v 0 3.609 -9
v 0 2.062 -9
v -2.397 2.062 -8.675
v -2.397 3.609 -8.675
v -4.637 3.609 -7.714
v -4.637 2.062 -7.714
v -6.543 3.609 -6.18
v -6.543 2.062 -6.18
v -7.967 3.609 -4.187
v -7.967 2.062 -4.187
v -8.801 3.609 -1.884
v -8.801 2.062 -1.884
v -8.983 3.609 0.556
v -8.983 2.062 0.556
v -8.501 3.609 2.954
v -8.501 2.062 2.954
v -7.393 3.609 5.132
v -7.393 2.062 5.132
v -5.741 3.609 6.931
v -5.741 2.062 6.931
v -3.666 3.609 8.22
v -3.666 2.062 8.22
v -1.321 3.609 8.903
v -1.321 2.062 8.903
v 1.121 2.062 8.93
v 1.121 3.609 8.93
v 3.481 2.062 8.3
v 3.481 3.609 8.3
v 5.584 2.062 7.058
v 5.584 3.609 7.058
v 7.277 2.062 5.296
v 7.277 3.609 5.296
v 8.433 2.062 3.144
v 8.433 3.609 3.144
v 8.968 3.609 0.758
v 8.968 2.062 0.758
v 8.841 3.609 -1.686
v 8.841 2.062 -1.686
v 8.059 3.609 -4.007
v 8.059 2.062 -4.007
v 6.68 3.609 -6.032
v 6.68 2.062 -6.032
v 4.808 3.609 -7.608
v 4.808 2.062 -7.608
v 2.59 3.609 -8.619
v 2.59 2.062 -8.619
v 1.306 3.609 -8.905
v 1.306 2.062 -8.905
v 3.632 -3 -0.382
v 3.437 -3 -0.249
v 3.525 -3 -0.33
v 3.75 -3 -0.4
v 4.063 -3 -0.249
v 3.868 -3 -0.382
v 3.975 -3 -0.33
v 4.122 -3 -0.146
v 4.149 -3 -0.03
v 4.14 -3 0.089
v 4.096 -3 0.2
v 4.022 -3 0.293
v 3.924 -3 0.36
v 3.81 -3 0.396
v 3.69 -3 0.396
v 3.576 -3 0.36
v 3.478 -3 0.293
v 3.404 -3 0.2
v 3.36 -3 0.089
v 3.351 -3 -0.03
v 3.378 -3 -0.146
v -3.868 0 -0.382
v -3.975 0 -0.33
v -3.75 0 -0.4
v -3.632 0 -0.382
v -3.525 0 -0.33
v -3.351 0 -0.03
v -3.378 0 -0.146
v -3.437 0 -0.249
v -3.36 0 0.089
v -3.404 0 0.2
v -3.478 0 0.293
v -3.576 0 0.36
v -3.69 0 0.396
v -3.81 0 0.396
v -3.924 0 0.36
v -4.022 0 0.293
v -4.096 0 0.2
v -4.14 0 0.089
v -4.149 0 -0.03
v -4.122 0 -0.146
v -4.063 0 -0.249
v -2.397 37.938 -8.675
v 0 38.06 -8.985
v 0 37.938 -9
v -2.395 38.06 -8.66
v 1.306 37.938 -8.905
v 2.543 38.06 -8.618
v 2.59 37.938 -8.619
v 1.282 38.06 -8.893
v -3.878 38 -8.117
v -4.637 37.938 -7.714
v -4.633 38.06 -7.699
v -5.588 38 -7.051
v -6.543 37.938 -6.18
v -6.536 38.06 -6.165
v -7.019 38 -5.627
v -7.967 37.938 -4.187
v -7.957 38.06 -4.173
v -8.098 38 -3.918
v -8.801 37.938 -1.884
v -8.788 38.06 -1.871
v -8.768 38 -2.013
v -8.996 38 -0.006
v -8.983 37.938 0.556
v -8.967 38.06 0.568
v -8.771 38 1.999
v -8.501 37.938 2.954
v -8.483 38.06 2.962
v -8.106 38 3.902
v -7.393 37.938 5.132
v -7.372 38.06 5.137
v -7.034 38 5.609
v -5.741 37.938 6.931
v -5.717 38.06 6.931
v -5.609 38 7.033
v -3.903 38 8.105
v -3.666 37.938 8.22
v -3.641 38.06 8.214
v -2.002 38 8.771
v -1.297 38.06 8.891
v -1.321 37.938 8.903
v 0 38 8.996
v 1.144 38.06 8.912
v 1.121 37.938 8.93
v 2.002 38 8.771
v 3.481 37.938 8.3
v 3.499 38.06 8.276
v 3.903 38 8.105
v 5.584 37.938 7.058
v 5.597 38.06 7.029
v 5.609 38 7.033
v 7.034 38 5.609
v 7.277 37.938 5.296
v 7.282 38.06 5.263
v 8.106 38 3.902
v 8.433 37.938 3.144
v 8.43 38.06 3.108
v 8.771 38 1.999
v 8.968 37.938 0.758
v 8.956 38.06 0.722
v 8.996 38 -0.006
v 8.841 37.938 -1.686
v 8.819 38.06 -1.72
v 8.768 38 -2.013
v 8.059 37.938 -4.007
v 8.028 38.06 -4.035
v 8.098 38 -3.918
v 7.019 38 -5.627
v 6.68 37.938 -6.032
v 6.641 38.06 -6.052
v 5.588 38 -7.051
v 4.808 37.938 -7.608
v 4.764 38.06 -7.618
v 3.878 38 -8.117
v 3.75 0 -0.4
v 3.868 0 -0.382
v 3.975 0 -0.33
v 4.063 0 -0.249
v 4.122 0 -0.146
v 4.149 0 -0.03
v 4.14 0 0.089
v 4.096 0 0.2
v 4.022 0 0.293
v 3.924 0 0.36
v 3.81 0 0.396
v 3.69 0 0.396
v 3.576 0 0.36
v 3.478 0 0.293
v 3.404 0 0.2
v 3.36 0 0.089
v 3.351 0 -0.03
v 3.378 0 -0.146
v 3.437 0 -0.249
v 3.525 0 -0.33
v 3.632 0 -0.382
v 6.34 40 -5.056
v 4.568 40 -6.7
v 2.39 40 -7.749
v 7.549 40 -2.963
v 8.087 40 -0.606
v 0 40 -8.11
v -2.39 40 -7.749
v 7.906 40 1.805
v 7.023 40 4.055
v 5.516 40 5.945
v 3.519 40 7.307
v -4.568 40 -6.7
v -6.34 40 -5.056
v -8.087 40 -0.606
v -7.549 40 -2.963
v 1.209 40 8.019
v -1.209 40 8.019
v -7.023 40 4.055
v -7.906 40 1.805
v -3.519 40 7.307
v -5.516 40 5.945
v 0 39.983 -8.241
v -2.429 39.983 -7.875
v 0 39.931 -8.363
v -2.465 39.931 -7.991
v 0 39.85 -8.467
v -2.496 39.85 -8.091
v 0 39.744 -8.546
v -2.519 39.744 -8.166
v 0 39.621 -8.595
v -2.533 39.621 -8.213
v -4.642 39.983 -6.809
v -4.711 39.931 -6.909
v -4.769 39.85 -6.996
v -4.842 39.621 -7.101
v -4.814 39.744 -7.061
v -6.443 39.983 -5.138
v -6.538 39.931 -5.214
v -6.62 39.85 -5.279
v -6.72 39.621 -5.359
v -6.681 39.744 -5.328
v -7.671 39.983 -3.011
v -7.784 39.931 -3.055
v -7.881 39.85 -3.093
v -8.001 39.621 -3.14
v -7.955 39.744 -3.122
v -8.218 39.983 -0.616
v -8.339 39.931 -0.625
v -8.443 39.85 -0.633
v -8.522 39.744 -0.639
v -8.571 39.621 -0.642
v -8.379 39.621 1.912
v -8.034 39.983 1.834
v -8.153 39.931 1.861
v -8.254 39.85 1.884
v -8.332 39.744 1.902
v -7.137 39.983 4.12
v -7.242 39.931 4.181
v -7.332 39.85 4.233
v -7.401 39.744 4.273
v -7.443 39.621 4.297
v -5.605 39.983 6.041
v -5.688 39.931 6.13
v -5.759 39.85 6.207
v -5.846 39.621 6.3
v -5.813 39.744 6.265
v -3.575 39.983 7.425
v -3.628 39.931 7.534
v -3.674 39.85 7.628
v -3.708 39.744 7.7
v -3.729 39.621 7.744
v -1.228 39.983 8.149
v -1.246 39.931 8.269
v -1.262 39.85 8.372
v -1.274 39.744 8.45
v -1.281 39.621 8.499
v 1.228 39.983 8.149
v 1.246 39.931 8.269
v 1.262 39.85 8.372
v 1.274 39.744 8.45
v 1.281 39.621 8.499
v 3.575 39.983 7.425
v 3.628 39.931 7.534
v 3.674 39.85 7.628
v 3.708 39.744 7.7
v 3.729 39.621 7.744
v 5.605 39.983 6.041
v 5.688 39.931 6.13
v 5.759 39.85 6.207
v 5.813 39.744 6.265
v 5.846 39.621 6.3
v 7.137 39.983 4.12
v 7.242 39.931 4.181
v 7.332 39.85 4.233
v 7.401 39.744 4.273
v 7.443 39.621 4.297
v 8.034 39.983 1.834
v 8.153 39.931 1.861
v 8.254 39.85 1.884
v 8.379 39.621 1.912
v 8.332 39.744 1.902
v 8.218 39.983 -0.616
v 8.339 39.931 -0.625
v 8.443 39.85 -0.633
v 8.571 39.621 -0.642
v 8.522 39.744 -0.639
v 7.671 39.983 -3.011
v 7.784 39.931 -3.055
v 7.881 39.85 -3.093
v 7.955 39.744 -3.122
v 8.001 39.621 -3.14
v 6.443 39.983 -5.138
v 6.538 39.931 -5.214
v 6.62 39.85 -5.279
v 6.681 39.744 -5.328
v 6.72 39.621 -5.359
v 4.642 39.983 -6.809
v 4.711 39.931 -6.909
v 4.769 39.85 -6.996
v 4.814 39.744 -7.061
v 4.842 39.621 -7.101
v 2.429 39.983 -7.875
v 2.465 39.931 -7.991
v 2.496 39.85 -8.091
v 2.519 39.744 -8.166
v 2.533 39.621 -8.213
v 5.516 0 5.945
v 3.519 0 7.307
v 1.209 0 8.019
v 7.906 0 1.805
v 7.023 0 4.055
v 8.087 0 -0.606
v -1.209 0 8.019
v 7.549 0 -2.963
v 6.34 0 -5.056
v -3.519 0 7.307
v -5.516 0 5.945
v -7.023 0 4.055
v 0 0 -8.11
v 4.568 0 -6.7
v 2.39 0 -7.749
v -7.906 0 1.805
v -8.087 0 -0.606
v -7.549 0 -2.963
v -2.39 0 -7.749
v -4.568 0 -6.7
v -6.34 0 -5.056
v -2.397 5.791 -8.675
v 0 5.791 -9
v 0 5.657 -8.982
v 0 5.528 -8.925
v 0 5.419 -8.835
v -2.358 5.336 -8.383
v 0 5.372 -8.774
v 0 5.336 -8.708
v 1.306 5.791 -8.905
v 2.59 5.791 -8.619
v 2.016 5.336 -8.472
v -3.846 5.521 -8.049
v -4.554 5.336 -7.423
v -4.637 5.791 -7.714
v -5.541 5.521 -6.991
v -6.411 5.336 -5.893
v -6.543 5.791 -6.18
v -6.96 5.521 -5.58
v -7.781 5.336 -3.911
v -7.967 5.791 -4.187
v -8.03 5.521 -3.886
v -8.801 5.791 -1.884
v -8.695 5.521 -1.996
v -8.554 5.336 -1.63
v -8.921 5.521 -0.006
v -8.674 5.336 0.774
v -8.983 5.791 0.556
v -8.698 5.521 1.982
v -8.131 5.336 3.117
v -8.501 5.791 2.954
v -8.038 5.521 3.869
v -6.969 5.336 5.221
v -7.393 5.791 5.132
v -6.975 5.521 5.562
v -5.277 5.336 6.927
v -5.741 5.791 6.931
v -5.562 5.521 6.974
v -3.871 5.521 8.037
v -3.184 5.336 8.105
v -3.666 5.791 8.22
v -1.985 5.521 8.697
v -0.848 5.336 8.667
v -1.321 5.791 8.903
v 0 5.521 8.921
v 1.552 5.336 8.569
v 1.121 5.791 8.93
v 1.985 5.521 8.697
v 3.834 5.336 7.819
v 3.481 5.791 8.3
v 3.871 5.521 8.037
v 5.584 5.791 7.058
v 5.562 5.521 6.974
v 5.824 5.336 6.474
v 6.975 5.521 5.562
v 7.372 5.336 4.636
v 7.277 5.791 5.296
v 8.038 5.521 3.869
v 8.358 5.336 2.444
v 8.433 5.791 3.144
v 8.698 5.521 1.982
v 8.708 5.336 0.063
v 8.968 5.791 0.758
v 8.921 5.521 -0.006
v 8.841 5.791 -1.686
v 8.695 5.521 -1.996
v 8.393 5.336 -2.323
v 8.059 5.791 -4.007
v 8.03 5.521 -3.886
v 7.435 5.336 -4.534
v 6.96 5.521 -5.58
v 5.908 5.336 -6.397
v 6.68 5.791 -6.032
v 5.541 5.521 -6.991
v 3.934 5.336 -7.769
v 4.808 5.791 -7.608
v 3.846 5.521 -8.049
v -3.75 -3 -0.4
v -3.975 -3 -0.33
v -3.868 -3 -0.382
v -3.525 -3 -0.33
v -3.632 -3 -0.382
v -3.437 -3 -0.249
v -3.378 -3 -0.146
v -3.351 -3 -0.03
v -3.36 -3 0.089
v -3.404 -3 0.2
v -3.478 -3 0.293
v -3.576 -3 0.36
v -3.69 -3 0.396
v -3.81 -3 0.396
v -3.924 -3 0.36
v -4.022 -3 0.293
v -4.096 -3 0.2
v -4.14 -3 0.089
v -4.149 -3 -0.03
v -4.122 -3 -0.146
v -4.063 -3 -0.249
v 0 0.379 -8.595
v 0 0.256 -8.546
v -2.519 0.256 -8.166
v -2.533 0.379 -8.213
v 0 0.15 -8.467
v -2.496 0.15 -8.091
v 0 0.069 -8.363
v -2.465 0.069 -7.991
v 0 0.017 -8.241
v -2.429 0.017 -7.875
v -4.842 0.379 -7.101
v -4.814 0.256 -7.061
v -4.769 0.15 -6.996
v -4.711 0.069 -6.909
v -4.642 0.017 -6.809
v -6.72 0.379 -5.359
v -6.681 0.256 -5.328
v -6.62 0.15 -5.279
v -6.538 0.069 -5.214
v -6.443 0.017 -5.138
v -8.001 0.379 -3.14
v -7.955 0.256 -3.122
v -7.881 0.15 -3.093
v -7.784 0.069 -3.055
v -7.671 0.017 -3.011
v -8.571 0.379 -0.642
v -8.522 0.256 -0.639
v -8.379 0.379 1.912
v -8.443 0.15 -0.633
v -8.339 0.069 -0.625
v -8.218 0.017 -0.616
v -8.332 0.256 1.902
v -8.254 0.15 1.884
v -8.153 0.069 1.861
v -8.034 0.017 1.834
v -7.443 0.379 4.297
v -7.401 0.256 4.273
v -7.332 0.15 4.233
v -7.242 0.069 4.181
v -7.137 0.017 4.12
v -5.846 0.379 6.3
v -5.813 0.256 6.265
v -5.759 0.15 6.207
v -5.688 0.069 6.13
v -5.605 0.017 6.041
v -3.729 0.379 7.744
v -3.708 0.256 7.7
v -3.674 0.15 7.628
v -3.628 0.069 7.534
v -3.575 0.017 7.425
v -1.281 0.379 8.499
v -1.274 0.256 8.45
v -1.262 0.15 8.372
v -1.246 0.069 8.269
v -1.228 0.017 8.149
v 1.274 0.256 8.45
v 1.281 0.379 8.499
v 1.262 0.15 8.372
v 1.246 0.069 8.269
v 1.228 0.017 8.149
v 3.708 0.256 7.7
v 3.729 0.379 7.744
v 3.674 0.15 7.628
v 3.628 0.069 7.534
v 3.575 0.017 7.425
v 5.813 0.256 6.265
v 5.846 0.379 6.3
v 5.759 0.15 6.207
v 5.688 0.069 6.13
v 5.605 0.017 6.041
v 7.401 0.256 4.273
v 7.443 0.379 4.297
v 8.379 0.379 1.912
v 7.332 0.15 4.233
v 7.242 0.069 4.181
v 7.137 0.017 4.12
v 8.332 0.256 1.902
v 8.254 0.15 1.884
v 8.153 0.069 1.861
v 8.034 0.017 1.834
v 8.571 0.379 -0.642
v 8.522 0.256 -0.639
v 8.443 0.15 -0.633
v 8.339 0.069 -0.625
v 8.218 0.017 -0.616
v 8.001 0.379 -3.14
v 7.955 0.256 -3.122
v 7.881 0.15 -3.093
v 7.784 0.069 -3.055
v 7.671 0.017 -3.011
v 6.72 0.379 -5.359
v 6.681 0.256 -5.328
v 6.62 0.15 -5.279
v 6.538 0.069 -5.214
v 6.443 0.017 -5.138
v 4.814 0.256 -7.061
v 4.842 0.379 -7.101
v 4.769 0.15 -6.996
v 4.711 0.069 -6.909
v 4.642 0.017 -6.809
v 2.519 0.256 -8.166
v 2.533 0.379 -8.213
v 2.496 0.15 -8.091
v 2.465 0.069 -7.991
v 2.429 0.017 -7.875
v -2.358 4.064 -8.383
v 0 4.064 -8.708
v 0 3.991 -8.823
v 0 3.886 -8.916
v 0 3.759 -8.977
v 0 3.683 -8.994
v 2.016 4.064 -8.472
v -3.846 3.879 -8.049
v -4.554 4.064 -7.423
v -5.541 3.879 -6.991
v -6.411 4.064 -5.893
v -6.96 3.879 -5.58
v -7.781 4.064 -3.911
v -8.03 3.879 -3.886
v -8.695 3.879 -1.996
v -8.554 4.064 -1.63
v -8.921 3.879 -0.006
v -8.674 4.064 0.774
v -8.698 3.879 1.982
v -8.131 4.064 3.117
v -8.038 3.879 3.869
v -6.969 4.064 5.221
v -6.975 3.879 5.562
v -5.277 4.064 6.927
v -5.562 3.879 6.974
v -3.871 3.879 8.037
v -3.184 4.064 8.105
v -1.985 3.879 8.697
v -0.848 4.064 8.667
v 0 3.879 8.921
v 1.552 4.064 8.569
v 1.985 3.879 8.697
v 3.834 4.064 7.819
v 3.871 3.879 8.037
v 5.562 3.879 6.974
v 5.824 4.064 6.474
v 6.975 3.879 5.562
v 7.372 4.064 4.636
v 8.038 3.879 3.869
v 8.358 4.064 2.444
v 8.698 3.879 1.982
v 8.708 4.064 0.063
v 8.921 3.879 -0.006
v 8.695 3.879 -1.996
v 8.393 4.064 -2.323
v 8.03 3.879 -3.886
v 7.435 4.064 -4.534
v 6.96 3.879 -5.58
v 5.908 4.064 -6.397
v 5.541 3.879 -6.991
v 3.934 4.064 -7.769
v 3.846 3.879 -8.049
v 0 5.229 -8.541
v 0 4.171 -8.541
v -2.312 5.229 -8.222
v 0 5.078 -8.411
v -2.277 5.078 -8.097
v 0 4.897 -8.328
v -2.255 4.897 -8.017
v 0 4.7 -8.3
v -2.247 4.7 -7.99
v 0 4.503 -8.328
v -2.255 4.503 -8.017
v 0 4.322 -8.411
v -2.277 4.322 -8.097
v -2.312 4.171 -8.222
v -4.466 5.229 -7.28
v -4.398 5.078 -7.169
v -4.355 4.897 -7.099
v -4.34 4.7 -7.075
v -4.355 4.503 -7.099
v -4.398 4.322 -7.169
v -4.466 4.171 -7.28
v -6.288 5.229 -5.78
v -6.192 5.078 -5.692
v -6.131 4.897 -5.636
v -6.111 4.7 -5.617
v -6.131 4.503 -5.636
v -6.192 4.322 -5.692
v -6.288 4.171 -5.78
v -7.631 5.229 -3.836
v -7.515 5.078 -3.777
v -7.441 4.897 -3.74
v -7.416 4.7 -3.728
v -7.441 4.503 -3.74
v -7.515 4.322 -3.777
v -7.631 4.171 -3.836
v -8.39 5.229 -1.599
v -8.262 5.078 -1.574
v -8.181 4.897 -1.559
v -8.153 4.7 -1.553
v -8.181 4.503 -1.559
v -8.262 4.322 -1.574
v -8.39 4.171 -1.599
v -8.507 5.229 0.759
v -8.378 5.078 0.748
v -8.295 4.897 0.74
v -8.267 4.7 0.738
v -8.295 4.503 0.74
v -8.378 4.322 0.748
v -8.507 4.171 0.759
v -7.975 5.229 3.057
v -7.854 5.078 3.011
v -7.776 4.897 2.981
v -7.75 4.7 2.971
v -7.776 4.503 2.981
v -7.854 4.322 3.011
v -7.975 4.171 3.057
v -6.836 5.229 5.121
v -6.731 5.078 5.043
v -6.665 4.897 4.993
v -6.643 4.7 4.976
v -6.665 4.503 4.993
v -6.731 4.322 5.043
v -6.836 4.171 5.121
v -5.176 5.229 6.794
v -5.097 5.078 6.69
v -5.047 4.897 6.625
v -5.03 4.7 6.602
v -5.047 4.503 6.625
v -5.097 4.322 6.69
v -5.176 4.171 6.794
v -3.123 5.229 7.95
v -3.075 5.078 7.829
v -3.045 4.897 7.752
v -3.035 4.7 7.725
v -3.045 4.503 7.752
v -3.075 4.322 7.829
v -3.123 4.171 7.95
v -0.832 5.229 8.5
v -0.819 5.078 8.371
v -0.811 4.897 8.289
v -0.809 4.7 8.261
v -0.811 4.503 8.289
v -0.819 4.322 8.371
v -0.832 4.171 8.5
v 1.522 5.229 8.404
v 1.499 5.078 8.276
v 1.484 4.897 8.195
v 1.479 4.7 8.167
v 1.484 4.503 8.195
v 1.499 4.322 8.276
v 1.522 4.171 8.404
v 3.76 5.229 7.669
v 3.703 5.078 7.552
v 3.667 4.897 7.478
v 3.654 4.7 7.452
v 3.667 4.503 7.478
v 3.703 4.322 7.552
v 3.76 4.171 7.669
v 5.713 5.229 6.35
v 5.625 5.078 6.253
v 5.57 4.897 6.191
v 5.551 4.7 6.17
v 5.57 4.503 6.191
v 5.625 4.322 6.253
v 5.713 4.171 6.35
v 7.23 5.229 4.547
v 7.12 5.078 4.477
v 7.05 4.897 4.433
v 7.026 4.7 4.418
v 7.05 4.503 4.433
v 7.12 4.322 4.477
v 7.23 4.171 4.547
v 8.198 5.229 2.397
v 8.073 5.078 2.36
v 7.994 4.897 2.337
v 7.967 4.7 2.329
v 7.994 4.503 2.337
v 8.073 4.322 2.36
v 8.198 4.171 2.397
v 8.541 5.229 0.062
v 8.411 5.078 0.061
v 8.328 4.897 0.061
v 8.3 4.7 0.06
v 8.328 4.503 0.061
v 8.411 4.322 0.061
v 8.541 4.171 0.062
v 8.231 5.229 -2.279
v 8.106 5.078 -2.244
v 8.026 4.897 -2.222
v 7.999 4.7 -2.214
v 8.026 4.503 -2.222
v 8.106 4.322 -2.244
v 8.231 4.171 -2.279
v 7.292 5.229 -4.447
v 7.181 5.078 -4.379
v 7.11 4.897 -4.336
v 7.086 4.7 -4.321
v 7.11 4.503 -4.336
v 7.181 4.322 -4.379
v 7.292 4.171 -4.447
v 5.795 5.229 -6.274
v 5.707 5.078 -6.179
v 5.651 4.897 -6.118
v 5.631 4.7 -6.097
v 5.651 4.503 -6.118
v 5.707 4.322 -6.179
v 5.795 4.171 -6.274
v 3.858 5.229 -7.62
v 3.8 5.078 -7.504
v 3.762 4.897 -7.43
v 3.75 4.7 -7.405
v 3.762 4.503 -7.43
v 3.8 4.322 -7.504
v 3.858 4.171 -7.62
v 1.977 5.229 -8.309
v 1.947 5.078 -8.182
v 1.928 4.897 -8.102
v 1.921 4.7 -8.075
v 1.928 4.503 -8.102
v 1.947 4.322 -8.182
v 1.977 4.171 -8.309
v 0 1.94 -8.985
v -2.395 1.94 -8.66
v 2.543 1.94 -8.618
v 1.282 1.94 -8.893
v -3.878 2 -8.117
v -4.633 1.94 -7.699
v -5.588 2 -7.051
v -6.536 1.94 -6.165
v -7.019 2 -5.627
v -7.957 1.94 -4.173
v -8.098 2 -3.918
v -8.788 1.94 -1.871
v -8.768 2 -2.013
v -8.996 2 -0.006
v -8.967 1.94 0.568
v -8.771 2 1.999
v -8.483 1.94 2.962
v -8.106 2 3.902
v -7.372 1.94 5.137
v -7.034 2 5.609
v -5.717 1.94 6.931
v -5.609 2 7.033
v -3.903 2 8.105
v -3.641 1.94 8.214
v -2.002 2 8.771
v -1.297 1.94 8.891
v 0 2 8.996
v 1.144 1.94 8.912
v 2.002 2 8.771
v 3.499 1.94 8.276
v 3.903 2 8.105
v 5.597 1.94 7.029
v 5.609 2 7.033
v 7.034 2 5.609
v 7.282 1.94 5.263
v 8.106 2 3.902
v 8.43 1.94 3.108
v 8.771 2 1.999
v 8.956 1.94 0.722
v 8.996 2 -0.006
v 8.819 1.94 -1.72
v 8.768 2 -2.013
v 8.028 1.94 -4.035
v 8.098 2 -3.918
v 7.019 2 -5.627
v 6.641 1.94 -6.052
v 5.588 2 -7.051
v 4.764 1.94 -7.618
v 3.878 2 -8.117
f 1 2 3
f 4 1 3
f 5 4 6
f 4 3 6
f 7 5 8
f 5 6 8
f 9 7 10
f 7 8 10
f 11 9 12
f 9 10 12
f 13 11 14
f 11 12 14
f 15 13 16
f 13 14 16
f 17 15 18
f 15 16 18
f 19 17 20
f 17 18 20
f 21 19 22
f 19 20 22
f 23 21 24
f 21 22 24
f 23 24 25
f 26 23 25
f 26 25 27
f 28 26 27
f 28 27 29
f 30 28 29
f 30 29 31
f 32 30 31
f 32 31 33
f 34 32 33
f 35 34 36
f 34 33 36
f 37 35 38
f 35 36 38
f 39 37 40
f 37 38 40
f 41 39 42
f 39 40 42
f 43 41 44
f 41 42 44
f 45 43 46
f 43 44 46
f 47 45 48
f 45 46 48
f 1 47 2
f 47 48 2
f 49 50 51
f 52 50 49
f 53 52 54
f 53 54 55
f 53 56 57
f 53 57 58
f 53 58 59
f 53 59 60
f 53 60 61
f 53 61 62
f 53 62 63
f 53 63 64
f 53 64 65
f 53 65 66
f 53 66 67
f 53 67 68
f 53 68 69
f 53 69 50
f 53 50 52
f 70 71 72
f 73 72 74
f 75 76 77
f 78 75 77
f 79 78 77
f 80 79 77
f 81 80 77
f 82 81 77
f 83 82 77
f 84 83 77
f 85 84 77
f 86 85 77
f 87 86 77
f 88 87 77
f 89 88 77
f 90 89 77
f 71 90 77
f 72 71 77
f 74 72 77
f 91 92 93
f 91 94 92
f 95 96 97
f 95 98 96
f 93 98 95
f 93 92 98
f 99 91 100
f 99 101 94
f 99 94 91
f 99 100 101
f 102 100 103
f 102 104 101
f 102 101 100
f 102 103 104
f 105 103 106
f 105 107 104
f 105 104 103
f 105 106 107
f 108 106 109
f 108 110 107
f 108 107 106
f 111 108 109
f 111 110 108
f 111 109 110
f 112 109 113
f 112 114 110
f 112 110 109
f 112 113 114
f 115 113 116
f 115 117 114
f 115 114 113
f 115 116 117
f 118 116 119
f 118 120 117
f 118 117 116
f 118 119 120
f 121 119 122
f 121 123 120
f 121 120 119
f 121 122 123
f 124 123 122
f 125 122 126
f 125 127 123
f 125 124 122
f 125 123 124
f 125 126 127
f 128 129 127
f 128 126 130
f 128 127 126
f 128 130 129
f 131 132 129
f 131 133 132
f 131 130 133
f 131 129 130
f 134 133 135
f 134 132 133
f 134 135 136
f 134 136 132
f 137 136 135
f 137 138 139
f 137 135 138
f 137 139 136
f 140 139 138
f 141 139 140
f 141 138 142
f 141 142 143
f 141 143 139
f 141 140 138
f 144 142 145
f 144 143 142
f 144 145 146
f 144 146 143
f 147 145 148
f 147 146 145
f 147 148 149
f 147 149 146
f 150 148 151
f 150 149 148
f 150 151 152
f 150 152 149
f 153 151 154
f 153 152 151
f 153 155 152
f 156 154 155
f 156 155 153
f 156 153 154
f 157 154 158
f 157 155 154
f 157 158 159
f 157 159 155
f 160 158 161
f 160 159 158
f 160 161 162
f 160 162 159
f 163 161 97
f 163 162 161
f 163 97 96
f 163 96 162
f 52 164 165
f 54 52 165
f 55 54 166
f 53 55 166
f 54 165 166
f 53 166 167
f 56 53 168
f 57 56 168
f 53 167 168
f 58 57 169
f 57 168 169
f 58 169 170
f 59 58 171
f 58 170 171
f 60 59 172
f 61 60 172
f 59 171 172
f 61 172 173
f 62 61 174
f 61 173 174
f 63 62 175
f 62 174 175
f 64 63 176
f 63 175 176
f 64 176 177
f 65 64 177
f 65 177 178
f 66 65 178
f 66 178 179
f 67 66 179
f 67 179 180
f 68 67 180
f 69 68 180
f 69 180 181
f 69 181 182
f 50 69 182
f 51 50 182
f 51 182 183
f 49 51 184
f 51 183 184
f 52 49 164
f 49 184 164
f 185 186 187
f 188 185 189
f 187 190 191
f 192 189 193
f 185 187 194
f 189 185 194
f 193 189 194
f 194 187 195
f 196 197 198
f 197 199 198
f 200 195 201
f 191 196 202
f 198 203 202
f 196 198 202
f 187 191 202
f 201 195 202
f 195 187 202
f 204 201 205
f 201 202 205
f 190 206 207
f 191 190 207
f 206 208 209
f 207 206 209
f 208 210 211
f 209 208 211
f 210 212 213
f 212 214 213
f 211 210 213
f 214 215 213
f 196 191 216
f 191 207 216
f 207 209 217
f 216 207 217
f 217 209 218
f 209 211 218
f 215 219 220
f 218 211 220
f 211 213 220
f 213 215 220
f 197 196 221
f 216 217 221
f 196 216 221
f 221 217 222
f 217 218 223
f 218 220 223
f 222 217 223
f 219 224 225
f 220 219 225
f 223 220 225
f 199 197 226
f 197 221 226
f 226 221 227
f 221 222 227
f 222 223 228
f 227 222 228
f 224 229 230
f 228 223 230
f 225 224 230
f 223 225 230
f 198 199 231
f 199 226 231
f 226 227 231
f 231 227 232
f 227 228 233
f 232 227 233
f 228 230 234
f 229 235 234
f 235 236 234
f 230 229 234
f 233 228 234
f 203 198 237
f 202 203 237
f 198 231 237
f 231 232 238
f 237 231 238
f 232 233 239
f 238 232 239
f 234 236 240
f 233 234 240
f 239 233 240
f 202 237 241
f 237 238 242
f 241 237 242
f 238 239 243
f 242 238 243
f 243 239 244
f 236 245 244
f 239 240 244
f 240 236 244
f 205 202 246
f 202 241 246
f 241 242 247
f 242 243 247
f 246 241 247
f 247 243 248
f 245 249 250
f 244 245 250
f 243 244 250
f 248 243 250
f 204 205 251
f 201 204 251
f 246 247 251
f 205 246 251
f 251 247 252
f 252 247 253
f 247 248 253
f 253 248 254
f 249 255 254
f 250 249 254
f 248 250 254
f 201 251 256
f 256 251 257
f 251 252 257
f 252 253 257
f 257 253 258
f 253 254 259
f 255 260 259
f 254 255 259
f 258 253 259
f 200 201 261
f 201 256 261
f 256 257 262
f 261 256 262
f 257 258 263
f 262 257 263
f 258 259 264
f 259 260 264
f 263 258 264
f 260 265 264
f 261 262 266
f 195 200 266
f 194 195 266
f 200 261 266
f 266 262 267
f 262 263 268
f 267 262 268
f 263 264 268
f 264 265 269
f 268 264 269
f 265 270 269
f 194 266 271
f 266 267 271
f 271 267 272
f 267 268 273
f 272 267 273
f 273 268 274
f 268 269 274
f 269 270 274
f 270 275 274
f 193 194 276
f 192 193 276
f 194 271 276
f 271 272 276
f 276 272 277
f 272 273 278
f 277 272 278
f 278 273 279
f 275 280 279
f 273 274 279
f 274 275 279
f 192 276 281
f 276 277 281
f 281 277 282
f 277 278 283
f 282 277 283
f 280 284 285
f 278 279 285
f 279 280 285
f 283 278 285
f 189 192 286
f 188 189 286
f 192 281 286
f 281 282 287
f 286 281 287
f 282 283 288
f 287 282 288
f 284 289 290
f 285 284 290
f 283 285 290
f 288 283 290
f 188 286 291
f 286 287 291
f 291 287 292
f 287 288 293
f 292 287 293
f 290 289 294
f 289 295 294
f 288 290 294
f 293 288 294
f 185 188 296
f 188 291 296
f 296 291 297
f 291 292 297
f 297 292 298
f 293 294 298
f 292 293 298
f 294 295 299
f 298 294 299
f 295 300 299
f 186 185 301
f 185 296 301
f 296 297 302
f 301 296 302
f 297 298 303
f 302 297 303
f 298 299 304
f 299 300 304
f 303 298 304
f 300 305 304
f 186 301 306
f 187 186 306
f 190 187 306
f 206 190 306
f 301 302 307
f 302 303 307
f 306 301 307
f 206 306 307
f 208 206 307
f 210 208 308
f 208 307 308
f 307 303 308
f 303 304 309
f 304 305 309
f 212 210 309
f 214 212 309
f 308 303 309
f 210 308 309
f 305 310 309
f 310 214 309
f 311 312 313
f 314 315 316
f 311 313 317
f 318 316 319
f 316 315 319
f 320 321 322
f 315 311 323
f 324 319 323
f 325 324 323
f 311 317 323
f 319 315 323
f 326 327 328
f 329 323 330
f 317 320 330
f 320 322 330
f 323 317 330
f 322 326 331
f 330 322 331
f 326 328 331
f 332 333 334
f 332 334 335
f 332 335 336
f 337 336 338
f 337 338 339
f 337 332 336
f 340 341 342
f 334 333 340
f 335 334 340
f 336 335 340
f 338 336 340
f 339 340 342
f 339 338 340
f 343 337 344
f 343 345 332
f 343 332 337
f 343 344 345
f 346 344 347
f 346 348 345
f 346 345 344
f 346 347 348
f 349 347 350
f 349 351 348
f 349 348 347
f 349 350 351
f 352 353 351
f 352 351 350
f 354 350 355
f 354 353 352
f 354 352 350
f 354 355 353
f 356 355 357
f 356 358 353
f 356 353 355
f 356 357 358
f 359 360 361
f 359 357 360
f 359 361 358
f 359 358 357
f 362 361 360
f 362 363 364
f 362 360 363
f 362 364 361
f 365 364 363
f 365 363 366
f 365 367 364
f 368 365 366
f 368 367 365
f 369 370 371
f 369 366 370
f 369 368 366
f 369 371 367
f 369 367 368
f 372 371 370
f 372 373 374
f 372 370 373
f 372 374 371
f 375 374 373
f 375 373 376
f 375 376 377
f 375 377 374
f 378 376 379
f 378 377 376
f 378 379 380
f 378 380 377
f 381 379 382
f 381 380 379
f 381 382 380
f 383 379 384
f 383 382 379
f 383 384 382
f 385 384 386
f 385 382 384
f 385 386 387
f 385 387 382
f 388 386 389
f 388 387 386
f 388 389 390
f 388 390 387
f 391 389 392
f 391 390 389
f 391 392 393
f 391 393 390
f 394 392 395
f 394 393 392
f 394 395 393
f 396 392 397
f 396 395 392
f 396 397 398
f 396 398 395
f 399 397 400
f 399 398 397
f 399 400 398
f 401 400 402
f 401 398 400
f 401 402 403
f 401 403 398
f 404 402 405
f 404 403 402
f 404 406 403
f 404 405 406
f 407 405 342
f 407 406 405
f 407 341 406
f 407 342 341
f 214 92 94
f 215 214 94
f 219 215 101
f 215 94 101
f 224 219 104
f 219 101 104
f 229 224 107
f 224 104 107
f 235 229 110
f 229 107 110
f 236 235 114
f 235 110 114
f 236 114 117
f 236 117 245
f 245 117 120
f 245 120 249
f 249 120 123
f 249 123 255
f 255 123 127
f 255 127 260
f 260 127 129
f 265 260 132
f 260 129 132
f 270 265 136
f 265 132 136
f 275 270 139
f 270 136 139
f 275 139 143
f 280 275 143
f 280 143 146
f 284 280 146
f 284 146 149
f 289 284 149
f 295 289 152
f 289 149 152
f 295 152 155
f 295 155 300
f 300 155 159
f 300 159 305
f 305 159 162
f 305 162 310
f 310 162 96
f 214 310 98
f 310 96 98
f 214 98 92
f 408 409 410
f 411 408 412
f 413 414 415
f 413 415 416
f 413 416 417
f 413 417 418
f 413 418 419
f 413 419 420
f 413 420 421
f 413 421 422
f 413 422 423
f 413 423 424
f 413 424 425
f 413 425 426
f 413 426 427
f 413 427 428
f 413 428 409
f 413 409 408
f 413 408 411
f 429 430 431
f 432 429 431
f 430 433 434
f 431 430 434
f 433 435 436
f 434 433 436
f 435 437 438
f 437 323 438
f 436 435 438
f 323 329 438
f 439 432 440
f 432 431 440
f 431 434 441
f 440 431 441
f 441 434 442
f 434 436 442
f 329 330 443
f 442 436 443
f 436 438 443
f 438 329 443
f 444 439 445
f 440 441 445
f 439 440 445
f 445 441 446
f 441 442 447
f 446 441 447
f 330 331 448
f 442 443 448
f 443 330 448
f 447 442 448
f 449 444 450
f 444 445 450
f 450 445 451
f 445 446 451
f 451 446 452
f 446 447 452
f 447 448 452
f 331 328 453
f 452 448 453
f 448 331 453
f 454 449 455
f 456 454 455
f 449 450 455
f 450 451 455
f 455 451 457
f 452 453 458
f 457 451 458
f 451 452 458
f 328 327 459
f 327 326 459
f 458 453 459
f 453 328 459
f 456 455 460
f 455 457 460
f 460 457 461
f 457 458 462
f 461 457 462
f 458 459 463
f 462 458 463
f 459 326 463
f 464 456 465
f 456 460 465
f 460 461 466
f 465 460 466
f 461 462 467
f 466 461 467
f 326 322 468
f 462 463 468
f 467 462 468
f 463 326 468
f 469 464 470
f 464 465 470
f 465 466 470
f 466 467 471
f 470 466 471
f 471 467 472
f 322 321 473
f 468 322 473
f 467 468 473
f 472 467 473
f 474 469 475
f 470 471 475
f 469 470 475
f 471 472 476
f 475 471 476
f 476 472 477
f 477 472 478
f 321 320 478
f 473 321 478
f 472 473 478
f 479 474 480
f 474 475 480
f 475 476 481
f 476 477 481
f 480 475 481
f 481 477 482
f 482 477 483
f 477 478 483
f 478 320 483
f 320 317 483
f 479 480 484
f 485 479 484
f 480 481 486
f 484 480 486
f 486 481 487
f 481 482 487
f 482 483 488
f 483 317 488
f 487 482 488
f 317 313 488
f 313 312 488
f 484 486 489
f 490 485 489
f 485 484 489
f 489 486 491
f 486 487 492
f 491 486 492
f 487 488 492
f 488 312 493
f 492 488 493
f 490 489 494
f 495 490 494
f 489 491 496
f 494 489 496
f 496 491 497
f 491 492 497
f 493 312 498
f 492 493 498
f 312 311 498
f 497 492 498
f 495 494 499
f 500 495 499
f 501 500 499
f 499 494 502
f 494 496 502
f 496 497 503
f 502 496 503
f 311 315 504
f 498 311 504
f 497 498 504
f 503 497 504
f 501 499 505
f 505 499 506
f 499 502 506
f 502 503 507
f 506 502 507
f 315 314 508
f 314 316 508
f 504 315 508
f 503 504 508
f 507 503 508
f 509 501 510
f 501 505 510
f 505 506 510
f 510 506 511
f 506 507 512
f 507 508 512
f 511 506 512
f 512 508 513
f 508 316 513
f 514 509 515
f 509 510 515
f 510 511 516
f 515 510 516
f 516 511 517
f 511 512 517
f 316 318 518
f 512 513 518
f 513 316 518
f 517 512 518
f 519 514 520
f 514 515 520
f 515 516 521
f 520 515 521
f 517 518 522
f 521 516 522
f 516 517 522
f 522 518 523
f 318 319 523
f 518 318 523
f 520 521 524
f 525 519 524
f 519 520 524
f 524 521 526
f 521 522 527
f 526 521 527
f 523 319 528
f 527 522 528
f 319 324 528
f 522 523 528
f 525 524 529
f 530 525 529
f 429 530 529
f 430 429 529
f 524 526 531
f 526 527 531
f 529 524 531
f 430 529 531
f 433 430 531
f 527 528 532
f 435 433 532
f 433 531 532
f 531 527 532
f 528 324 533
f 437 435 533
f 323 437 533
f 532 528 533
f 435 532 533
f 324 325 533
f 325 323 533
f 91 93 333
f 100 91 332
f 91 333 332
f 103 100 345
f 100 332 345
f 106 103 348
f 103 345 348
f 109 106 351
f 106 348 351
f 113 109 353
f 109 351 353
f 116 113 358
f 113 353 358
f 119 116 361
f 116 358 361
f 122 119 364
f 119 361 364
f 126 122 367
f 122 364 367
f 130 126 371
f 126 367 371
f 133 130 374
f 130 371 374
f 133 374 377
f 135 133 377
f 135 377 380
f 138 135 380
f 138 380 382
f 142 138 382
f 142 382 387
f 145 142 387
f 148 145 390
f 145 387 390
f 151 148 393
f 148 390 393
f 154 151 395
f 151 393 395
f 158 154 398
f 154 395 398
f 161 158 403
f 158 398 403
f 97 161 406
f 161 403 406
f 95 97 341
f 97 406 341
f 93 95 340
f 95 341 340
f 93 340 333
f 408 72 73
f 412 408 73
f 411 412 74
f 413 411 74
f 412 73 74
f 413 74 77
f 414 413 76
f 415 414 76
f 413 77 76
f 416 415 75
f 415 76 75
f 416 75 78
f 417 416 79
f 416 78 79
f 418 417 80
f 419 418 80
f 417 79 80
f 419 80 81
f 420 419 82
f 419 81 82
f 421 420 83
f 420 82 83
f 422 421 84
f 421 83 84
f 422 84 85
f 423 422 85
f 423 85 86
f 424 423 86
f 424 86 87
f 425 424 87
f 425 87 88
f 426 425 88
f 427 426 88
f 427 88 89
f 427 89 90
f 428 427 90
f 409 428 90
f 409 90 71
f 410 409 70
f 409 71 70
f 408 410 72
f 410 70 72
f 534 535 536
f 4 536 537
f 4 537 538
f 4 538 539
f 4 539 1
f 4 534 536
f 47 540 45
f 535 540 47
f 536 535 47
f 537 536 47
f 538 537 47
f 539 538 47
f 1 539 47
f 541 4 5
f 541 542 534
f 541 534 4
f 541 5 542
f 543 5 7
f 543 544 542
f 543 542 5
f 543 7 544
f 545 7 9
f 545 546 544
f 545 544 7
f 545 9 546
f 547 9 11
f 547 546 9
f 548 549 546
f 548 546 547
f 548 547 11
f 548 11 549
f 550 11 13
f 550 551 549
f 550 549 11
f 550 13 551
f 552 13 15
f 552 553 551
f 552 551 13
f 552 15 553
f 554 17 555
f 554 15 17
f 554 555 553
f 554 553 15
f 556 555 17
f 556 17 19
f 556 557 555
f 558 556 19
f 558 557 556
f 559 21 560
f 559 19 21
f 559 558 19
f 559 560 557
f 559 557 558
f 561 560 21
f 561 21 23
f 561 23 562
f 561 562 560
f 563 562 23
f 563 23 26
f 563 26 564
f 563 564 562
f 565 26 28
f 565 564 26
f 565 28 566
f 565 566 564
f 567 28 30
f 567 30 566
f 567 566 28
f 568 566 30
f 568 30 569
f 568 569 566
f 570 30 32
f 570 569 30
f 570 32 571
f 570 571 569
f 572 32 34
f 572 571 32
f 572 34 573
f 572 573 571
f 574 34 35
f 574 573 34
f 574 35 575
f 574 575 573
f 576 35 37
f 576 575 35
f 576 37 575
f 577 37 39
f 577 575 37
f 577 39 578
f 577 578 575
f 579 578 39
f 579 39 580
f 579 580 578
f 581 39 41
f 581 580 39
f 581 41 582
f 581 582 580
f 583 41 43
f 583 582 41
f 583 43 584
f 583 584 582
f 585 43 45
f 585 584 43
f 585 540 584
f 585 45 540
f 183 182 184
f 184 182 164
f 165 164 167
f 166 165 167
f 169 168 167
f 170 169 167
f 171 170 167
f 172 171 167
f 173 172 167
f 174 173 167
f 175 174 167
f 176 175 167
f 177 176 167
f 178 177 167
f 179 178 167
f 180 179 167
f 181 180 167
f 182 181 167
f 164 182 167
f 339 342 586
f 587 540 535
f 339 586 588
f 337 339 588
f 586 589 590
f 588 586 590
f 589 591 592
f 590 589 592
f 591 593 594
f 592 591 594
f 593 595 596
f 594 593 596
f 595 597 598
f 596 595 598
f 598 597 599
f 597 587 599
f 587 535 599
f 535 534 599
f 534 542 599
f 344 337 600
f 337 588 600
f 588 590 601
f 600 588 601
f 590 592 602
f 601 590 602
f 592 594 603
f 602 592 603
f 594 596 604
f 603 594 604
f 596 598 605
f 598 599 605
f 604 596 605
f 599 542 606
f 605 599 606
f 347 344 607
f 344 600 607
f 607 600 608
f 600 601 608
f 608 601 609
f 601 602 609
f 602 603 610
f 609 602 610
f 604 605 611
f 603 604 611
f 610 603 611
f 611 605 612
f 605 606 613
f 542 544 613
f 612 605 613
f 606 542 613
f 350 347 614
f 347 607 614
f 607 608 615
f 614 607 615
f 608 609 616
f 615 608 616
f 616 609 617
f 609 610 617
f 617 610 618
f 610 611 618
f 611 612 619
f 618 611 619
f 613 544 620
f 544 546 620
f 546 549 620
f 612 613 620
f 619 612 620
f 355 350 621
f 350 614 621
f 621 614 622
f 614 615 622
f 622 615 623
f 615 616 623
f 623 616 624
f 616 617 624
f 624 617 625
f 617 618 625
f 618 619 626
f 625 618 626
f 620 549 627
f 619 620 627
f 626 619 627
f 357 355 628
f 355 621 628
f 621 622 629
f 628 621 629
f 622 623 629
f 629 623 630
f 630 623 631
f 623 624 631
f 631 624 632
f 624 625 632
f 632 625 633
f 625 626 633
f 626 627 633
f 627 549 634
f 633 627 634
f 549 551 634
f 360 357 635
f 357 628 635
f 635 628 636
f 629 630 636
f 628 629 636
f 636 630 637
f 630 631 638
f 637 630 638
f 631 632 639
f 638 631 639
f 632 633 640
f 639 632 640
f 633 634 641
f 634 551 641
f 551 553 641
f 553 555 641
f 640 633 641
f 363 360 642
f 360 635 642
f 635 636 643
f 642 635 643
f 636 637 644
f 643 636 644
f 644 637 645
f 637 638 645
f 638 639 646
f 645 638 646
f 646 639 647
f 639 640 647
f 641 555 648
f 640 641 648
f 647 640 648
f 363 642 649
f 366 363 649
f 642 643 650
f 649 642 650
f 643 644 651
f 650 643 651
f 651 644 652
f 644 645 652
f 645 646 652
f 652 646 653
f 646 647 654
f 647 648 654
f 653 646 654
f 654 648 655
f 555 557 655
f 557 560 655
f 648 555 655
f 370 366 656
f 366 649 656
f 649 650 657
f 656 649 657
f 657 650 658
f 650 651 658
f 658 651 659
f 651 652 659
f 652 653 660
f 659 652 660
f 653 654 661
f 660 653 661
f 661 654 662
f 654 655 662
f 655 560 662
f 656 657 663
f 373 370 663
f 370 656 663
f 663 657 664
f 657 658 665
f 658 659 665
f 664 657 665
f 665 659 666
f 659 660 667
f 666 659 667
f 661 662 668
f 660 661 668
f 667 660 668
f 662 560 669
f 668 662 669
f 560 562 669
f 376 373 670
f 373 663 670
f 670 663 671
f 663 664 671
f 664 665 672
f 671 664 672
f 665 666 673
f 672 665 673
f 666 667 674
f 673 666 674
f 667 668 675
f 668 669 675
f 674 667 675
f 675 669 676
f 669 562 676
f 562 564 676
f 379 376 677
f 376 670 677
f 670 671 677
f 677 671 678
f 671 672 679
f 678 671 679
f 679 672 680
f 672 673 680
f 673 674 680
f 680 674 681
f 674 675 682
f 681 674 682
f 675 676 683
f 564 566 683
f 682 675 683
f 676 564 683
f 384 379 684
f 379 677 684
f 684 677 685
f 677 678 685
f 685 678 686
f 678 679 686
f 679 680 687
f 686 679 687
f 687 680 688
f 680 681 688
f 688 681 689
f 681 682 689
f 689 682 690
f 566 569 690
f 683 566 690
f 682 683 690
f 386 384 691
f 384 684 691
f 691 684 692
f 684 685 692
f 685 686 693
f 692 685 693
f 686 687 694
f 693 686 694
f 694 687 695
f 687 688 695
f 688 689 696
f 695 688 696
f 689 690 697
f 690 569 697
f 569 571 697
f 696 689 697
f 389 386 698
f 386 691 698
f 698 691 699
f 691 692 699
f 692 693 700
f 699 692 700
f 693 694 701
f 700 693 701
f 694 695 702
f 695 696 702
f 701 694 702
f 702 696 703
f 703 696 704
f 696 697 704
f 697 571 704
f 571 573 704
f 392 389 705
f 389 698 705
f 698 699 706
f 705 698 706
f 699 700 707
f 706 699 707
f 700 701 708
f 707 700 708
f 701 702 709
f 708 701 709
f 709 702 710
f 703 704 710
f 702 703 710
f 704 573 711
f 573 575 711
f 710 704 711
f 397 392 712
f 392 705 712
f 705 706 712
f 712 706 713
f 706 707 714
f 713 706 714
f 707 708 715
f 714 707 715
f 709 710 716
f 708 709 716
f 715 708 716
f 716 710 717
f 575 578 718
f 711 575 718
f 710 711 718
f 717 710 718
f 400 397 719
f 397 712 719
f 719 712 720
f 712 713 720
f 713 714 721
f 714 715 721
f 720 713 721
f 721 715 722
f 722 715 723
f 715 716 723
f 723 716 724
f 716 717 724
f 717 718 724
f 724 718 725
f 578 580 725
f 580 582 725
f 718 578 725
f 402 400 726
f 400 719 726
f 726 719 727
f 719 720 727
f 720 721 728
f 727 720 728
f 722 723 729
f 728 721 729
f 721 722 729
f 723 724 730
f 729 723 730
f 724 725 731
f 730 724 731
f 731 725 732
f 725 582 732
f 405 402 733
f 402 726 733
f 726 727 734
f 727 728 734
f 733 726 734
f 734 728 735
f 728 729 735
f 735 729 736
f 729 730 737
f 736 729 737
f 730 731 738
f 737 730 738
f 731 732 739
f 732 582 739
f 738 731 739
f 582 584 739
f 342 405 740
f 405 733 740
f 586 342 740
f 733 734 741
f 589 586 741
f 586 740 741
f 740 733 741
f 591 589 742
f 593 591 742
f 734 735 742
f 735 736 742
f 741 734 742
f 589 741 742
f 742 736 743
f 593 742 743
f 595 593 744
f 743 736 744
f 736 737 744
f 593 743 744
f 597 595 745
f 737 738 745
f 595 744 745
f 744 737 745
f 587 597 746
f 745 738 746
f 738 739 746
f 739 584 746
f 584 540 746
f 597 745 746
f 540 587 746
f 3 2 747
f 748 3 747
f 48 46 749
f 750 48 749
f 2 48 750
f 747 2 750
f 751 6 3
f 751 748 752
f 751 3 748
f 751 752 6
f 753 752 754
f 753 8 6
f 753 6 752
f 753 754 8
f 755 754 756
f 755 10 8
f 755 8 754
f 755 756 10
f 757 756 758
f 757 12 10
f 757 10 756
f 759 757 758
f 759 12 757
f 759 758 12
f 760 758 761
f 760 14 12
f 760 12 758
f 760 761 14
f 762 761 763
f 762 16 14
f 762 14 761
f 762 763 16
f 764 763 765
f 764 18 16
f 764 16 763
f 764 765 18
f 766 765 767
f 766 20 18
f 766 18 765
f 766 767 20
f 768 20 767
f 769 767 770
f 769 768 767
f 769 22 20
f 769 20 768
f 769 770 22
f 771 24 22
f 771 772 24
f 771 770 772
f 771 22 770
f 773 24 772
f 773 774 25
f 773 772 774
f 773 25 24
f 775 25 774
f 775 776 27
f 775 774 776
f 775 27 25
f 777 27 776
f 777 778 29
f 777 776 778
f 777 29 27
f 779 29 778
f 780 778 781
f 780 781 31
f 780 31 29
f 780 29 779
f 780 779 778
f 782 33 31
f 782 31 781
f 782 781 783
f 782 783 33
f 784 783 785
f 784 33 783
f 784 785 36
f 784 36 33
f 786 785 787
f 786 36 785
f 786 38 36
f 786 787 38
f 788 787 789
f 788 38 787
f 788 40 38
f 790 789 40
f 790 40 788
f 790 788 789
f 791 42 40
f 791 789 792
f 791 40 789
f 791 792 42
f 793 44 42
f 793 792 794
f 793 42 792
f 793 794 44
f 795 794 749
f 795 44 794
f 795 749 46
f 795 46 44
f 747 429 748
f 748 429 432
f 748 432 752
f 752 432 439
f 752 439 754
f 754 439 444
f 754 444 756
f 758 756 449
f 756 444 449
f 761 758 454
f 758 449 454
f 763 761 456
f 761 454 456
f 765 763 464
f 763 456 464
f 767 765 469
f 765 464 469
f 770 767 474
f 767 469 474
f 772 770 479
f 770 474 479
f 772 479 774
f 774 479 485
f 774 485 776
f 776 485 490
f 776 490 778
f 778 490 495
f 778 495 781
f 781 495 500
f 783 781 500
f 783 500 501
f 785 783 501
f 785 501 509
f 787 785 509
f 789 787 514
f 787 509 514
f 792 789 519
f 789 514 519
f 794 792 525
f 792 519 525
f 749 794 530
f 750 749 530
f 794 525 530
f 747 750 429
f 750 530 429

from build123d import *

# Parameters (mm, degrees)
ZAOBLIT1_R                = 0.5
SKICA2_R                  = 0.4
P_IDAT_VYSUNUT_M1_DEPTH   = 3
P_IDAT_VYSUNUT_M1_2_DEPTH = 3


with BuildPart() as part:
    # Skica1 → Rotovat1 (revolve)
    with BuildSketch(Plane.XY, mode=Mode.PRIVATE) as rotovat1_sk:
        with BuildLine():
            Line((0, 40), (8.5, 40))
            Line((8.5, 40), (9, 38))
            Line((9, 38), (9, 5.4))
            ThreePointArc((9, 5.4), (8.3, 4.7), (9, 4))
            Line((9, 4), (9, 2))
            Line((9, 2), (8.5, 0))
            Line((8.5, 0), (0, 0))
            Line((0, 0), (0, 40))
        make_face()
    revolve(rotovat1_sk.sketch.rotate(Axis((0, 0, 0), (0, 1, 0)), 90), axis=Axis((0, 0, 0), (0, 1, 0)))

    # Zaoblit1
    zaoblit1_edges = [part.edges().sort_by_distance(p)[0] for p in [
        (0, 40, 8.5),
        (0, 38, 9),
        (0, 5.4, 9),
        (0, 4, 9),
        (0, 2, 9),
        (0, 0, 8.5),
    ]]
    fillet(zaoblit1_edges, radius=ZAOBLIT1_R)


with BuildPart() as body_2:
    # Skica2 → Přidat vysunutím1 (new body)
    with BuildSketch(Plane.XZ):
        with Locations(Location((-3.75, 0, 0), (0, 0, 270))):
            Circle(SKICA2_R)
    extrude(amount=P_IDAT_VYSUNUT_M1_DEPTH)


with BuildPart() as body_3:
    # Skica2 → P_idat vysunut_m1 2 (new body)
    with BuildSketch(Plane.XZ):
        with Locations(Location((3.75, 0, 0), (0, 0, 270))):
            Circle(SKICA2_R)
    extrude(amount=P_IDAT_VYSUNUT_M1_2_DEPTH)


solid = Compound([part.part, body_2.part, body_3.part])
